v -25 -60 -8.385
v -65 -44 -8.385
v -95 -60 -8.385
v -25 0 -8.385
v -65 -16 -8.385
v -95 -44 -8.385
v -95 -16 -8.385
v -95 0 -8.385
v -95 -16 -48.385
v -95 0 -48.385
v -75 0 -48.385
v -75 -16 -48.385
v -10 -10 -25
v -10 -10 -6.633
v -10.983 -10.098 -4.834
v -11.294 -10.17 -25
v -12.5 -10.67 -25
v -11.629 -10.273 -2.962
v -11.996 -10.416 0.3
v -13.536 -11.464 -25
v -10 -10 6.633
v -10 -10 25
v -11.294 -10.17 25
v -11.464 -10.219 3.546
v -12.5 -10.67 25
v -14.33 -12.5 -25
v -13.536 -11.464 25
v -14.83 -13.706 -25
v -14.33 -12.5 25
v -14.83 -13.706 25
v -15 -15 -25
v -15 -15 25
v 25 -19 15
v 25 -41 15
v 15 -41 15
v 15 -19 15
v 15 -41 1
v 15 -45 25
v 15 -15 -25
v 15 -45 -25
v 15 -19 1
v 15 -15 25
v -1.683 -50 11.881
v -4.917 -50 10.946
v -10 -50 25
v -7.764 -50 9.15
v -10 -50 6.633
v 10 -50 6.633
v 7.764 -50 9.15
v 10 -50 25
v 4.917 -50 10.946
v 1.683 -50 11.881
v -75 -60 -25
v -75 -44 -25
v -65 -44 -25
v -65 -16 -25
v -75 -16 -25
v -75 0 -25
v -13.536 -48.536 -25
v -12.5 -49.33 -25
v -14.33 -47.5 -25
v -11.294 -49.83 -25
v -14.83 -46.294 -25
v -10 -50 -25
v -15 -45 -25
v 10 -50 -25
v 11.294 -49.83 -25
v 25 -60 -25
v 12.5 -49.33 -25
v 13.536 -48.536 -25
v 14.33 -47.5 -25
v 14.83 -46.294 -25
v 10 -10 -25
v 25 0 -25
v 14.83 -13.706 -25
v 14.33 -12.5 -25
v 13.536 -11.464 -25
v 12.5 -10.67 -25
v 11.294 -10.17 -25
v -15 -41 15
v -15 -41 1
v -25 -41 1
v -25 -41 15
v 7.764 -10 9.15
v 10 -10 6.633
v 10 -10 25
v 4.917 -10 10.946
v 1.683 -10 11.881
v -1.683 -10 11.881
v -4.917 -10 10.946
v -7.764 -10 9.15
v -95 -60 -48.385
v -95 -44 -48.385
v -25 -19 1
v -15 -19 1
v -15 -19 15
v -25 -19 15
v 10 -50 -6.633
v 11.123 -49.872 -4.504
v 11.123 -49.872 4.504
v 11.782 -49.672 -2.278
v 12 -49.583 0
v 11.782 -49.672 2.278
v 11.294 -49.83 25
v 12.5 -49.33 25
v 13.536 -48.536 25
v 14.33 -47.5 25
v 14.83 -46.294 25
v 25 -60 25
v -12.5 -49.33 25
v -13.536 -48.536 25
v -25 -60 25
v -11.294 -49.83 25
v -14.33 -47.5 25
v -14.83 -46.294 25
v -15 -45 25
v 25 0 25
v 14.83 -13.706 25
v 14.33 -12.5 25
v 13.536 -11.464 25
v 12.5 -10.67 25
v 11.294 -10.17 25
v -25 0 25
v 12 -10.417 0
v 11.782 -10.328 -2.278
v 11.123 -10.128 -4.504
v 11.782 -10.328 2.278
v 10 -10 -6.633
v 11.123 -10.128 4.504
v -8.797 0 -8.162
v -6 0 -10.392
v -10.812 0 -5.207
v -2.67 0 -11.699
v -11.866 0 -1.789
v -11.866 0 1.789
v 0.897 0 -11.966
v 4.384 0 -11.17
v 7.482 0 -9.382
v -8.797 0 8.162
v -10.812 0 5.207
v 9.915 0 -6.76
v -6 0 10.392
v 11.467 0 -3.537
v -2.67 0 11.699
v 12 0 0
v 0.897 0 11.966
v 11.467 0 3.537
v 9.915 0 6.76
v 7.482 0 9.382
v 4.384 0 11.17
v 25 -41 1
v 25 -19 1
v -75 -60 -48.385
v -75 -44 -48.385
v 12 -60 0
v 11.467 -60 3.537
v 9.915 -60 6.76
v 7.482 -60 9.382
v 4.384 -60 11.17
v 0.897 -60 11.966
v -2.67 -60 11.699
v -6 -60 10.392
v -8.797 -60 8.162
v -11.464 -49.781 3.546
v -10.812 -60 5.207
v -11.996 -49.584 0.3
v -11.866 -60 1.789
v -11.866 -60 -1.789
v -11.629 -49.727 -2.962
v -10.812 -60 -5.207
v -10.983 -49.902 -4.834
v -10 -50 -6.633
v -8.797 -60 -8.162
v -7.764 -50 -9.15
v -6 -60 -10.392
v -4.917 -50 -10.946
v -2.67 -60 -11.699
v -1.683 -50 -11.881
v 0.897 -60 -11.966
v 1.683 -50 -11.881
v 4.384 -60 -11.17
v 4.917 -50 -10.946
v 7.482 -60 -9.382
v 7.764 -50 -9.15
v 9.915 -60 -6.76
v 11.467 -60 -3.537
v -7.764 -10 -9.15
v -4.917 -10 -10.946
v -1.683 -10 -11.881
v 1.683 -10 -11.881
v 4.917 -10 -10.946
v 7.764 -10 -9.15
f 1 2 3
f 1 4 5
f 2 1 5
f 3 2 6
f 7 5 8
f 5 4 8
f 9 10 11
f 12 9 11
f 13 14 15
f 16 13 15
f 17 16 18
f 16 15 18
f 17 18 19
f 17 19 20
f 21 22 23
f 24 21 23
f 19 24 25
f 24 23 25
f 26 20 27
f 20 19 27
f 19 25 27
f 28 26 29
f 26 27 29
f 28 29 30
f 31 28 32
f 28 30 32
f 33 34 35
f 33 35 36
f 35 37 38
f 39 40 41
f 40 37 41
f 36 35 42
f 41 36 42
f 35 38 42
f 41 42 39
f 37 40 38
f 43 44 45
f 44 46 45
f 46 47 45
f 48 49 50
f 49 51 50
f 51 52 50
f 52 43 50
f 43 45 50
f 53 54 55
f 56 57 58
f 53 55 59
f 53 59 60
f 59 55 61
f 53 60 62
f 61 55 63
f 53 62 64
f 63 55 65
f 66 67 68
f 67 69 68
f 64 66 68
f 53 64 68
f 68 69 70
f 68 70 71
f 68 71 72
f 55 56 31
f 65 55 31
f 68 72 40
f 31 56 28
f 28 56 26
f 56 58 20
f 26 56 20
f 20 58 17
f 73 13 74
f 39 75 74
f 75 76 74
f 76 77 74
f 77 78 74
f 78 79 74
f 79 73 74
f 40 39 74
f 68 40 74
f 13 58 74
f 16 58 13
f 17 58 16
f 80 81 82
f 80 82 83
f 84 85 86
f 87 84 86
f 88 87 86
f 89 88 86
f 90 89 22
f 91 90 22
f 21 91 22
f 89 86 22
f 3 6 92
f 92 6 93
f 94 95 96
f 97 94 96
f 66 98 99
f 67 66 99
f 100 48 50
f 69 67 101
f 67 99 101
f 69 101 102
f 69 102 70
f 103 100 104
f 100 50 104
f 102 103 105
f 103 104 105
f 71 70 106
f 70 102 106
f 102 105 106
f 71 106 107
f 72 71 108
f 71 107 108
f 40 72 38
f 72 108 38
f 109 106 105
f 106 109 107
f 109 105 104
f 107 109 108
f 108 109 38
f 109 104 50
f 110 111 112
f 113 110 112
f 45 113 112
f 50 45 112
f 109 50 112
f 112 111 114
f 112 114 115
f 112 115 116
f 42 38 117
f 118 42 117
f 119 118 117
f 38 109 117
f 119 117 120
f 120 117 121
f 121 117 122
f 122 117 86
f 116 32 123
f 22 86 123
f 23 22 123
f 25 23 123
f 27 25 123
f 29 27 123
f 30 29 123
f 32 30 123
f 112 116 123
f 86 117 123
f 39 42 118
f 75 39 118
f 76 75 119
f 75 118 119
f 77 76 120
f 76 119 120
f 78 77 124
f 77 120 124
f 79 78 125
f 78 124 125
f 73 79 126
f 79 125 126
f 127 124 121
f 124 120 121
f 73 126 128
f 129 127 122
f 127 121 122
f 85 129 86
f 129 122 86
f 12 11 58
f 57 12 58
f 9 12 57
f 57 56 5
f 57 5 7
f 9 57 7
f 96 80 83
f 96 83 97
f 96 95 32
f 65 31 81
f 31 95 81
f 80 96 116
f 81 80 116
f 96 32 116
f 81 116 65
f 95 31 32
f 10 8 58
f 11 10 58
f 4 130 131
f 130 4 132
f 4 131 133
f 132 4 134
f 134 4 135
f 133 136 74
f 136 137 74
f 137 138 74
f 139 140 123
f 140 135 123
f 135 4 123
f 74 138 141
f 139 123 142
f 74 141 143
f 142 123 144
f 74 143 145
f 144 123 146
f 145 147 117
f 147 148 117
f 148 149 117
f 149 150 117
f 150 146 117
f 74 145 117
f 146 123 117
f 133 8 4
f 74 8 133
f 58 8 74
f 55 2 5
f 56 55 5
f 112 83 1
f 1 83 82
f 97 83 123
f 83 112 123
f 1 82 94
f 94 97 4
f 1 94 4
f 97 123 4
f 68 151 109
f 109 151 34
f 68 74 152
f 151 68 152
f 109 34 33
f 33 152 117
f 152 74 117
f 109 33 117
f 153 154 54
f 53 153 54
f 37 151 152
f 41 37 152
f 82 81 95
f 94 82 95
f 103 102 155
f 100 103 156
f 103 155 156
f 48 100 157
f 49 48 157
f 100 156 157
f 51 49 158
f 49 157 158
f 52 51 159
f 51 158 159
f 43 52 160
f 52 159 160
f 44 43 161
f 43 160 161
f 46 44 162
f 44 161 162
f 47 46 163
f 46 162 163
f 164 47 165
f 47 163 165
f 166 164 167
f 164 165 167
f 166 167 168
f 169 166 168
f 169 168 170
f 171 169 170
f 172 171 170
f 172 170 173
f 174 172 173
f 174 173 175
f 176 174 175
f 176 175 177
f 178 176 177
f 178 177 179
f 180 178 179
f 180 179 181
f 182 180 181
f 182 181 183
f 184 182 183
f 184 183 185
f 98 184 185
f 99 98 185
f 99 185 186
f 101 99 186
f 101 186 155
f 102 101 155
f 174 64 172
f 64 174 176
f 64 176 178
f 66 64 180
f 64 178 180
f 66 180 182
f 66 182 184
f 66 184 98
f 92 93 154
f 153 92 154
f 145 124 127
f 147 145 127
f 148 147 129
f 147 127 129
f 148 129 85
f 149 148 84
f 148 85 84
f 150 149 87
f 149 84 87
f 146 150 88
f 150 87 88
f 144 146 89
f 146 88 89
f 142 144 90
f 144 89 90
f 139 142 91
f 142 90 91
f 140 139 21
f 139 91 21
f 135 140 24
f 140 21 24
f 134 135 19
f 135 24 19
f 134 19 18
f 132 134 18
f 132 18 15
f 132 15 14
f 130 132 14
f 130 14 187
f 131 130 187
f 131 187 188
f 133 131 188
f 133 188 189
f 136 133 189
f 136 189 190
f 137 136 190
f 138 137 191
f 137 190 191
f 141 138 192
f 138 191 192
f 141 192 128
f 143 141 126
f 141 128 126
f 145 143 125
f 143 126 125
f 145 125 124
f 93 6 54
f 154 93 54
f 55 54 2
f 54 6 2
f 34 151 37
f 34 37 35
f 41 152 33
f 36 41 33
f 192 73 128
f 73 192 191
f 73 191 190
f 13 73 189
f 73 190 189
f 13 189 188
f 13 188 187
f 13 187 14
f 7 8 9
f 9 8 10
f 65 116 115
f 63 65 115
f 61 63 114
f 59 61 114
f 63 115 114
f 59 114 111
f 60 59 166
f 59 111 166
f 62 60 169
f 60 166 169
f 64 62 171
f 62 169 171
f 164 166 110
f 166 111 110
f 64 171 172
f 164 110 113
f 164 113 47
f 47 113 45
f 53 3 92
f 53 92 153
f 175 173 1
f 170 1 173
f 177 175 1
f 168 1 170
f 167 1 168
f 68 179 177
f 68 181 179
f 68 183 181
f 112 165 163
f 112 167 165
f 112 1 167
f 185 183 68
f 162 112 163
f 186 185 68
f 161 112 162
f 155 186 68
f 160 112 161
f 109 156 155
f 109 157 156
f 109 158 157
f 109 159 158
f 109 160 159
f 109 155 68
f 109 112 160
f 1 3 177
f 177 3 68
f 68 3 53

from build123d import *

# Parameters (mm, degrees)
F1_DEPTH = 60
F2_R     = 12
F3_DEPTH = 60.001
F5_DEPTH = 40.001
F7_DEPTH = 73.386132
F8_W     = 22
F8_H     = 14
F9_DEPTH = 120.001


with BuildPart() as f1:
    # F0 (on Front) → F1 (new body)
    with BuildSketch(Plane.XZ):
        Polygon((-25, -8.385132), (-25, -25), (25, -25), (25, 25), (-25, 25), align=None)
        Polygon((-75, -25), (-25, -25), (-25, -8.385132), (-95, -8.385132), (-95, -48.385132), (-75, -48.385132), align=None)
    extrude(amount=F1_DEPTH)

    # F2 (on face) → F3 (cut, through all)
    with BuildSketch(Plane.XZ.offset(60)):
        Circle(F2_R)
    extrude(amount=-F3_DEPTH, mode=Mode.SUBTRACT)

    # F4 (on face) → F5 (cut, through all)
    with BuildSketch(Plane.XY.offset(-8.385132)):
        Polygon((-95, -44), (-65, -44), (-65, -16), (-125, -16), (-125, -44), align=None)
        with BuildLine():
            ThreePointArc((-15, -45), (-13.535534, -48.535534), (-10, -50))
            Line((-10, -50), (10, -50))
            ThreePointArc((10, -50), (13.535534, -48.535534), (15, -45))
            Line((15, -45), (15, -15))
            ThreePointArc((15, -15), (13.535534, -11.464466), (10, -10))
            Line((10, -10), (-10, -10))
            ThreePointArc((-10, -10), (-13.535534, -11.464466), (-15, -15))
            Line((-15, -15), (-15, -45))
        make_face()
    extrude(amount=-F5_DEPTH, mode=Mode.SUBTRACT)

    # F6 (on face) → F7 (cut, through all)
    with BuildSketch(Plane.XY.offset(25)):
        with BuildLine():
            ThreePointArc((-15, -45), (-13.535534, -48.535534), (-10, -50))
            Line((-10, -50), (10, -50))
            ThreePointArc((10, -50), (13.535534, -48.535534), (15, -45))
            Line((15, -45), (15, -15))
            ThreePointArc((15, -15), (13.535534, -11.464466), (10, -10))
            Line((10, -10), (-10, -10))
            ThreePointArc((-10, -10), (-13.535534, -11.464466), (-15, -15))
            Line((-15, -15), (-15, -45))
        make_face()
    extrude(amount=-F7_DEPTH, mode=Mode.SUBTRACT)

    # F8 (on face) → F9 (cut, through all)
    with BuildSketch(Plane.YZ.offset(25)):
        with Locations((-30, 8)):
            Rectangle(F8_W, F8_H)
    extrude(amount=-F9_DEPTH, mode=Mode.SUBTRACT)


solid = f1.part
